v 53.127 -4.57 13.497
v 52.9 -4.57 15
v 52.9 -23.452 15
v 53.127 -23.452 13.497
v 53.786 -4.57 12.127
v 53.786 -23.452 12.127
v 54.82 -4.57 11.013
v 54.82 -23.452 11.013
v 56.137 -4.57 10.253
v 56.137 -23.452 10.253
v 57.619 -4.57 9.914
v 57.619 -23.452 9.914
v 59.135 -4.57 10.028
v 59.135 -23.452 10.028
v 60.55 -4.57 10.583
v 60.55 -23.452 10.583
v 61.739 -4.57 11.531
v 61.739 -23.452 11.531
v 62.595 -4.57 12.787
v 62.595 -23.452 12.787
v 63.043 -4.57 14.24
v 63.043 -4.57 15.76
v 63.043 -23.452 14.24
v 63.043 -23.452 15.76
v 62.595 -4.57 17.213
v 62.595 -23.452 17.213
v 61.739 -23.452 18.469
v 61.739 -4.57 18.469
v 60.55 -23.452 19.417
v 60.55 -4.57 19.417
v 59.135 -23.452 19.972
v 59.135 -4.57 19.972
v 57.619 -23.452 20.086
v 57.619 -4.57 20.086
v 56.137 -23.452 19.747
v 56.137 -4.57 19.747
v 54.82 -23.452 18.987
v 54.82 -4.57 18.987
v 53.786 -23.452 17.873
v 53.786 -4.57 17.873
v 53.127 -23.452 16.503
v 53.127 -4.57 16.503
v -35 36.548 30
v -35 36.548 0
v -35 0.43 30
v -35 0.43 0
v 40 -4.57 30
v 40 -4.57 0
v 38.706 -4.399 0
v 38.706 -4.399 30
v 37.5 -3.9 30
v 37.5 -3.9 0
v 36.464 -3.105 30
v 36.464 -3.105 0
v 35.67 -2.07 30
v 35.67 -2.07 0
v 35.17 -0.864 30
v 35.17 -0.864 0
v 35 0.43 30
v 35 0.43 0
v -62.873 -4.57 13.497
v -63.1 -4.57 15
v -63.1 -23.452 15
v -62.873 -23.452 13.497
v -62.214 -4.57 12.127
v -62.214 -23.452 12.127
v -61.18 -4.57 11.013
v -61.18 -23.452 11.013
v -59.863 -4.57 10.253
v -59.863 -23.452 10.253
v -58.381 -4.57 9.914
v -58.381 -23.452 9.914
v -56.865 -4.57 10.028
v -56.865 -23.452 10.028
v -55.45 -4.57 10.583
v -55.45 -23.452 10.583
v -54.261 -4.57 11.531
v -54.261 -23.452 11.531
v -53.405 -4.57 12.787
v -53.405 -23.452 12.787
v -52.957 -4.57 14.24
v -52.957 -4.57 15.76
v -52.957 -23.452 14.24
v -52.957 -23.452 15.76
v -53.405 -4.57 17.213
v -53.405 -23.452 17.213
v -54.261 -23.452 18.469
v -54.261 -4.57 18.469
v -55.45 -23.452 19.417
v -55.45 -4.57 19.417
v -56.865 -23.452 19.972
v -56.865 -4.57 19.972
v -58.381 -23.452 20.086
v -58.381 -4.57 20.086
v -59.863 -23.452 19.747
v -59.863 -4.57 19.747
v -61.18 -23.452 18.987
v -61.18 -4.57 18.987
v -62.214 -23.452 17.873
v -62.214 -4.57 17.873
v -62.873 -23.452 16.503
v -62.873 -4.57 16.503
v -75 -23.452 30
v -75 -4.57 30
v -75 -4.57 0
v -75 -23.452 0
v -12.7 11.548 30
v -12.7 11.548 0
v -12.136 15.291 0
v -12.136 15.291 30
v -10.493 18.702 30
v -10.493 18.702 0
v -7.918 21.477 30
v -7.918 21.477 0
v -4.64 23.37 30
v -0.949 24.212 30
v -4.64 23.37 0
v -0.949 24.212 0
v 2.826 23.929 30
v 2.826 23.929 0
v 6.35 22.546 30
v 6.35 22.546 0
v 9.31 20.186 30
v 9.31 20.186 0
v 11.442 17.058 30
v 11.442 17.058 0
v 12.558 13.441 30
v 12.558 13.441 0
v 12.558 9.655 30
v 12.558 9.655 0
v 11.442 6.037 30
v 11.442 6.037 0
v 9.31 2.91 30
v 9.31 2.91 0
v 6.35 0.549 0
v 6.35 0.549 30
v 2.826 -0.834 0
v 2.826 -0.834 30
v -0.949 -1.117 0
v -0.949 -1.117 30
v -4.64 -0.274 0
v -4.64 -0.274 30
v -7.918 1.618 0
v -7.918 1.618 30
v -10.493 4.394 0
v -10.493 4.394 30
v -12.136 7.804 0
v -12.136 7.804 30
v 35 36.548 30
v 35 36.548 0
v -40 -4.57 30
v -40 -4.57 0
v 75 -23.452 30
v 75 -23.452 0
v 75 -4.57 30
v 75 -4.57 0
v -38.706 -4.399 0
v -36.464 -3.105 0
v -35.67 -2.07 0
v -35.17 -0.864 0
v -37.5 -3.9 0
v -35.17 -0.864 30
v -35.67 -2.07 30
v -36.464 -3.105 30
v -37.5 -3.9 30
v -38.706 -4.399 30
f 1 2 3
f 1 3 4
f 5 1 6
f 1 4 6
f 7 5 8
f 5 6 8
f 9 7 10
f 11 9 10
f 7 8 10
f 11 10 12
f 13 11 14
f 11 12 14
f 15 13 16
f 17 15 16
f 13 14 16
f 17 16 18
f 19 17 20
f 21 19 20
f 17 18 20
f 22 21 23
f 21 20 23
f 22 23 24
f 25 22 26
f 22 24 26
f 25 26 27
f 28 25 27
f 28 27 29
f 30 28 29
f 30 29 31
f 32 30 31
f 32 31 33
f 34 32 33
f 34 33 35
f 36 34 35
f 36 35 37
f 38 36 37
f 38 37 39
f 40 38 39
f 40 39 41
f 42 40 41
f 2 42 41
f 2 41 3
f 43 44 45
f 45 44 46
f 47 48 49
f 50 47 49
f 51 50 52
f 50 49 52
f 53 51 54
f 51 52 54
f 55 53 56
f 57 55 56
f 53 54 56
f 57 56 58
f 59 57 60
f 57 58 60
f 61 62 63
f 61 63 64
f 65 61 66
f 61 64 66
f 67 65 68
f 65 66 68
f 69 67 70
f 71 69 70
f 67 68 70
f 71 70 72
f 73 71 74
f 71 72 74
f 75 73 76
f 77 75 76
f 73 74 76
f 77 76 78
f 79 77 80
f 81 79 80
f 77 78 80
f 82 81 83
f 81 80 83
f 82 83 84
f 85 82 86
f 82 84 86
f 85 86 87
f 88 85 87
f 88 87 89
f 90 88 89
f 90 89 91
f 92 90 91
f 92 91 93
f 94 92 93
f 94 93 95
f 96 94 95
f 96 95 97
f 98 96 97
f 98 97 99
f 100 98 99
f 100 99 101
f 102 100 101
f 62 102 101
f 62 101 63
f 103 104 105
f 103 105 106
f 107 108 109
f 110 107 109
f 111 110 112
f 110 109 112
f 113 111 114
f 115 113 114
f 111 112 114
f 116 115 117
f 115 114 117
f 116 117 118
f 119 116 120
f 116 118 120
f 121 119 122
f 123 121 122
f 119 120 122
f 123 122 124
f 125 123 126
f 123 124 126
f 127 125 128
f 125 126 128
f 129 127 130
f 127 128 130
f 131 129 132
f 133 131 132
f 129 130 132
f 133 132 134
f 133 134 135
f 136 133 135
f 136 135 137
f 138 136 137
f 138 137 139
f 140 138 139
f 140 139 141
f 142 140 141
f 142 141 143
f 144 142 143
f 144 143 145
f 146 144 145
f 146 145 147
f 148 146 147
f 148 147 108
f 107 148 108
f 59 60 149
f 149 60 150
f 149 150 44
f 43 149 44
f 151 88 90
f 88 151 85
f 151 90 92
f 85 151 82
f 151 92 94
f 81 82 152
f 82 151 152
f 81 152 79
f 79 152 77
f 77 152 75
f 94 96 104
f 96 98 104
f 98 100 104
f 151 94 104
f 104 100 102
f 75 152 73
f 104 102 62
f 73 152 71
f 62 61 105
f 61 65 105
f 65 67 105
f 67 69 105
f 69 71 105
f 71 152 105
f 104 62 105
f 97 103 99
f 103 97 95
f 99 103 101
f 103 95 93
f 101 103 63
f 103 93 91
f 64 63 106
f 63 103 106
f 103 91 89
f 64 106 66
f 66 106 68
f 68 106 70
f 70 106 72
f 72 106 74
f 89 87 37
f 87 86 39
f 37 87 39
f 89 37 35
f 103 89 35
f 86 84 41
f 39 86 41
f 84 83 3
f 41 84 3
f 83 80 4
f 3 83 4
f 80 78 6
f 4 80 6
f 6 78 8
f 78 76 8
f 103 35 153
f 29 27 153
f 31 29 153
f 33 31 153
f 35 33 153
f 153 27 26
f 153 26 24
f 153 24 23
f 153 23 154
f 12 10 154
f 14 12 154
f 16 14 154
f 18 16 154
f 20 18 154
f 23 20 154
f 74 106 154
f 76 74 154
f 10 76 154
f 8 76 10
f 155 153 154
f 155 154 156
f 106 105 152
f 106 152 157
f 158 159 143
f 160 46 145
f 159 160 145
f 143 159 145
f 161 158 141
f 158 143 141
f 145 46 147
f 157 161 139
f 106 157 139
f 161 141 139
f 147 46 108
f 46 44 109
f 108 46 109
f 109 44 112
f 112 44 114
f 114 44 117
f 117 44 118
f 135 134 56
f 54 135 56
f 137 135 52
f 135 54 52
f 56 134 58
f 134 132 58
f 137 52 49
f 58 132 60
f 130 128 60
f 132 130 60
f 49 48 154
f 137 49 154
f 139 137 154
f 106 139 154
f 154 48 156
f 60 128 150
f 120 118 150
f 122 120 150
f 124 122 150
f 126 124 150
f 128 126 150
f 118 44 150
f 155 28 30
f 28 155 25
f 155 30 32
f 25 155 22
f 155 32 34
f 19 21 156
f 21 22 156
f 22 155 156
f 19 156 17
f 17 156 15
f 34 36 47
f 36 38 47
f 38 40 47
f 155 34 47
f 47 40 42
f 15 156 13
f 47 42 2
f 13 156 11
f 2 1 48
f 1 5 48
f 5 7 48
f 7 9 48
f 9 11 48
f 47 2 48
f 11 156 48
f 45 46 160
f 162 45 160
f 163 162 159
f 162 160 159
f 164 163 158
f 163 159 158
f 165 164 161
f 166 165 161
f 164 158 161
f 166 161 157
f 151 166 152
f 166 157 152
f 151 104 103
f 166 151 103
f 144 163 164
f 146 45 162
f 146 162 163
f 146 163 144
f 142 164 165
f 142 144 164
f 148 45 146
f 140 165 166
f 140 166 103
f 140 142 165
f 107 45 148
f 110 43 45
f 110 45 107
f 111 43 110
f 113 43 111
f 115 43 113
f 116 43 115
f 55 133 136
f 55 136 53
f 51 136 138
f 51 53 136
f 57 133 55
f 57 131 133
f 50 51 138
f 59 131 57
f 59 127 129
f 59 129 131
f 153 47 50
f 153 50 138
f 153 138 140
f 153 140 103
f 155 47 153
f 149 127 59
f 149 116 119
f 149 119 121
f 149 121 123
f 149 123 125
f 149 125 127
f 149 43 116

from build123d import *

# Parameters (mm, degrees)
BOSS_EXTRUDE1_DEPTH               = 30
F_1_1_0000_DOWEL_HOLE1_D          = 25.4
TAP_DRILL_FOR_M12X1_75_TAP1_D     = 10.2
TAP_DRILL_FOR_M12X1_75_TAP1_DEPTH = 30
TAP_DRILL_FOR_M12X1_75_TAP1_TIP   = 3.064389157


with BuildPart() as part:
    # Sketch1 → Boss-Extrude1 (new body)
    with BuildSketch(Plane.XY):
        with BuildLine():
            Line((-75, -23.452240915), (75, -23.452240915))
            Line((75, -23.452240915), (75, -4.569806156))
            Line((75, -4.569806156), (40, -4.569806156))
            ThreePointArc((40, -4.569806156), (36.464466094, -3.105340062), (35, 0.430193844))
            Line((35, 0.430193844), (35, 36.547759085))
            Line((35, 36.547759085), (-35, 36.547759085))
            Line((-35, 36.547759085), (-35, 0.430193844))
            ThreePointArc((-35, 0.430193844), (-36.464466094, -3.105340062), (-40, -4.569806156))
            Line((-40, -4.569806156), (-75, -4.569806156))
            Line((-75, -4.569806156), (-75, -23.452240915))
        make_face()
    extrude(amount=BOSS_EXTRUDE1_DEPTH)

    # 1 (1.0000) Dowel Hole1 (through all)
    with Locations(Plane.XY.offset(30)):
        with Locations((0, 11.547759085)):
            Hole(F_1_1_0000_DOWEL_HOLE1_D / 2)

    # Tap Drill for M12x1.75 Tap1
    with Locations(Plane(origin=(0, -4.569806156, 0), x_dir=(1, 0, 0), z_dir=(0, 1, 0))):
        with Locations((58, -15), (-58, -15)):
            Hole(TAP_DRILL_FOR_M12X1_75_TAP1_D / 2, depth=TAP_DRILL_FOR_M12X1_75_TAP1_DEPTH)
            with Locations((0, 0, -(TAP_DRILL_FOR_M12X1_75_TAP1_DEPTH + TAP_DRILL_FOR_M12X1_75_TAP1_TIP / 2))):  # 118° drill point
                Cone(0, TAP_DRILL_FOR_M12X1_75_TAP1_D / 2, TAP_DRILL_FOR_M12X1_75_TAP1_TIP, mode=Mode.SUBTRACT)


solid = part.part
